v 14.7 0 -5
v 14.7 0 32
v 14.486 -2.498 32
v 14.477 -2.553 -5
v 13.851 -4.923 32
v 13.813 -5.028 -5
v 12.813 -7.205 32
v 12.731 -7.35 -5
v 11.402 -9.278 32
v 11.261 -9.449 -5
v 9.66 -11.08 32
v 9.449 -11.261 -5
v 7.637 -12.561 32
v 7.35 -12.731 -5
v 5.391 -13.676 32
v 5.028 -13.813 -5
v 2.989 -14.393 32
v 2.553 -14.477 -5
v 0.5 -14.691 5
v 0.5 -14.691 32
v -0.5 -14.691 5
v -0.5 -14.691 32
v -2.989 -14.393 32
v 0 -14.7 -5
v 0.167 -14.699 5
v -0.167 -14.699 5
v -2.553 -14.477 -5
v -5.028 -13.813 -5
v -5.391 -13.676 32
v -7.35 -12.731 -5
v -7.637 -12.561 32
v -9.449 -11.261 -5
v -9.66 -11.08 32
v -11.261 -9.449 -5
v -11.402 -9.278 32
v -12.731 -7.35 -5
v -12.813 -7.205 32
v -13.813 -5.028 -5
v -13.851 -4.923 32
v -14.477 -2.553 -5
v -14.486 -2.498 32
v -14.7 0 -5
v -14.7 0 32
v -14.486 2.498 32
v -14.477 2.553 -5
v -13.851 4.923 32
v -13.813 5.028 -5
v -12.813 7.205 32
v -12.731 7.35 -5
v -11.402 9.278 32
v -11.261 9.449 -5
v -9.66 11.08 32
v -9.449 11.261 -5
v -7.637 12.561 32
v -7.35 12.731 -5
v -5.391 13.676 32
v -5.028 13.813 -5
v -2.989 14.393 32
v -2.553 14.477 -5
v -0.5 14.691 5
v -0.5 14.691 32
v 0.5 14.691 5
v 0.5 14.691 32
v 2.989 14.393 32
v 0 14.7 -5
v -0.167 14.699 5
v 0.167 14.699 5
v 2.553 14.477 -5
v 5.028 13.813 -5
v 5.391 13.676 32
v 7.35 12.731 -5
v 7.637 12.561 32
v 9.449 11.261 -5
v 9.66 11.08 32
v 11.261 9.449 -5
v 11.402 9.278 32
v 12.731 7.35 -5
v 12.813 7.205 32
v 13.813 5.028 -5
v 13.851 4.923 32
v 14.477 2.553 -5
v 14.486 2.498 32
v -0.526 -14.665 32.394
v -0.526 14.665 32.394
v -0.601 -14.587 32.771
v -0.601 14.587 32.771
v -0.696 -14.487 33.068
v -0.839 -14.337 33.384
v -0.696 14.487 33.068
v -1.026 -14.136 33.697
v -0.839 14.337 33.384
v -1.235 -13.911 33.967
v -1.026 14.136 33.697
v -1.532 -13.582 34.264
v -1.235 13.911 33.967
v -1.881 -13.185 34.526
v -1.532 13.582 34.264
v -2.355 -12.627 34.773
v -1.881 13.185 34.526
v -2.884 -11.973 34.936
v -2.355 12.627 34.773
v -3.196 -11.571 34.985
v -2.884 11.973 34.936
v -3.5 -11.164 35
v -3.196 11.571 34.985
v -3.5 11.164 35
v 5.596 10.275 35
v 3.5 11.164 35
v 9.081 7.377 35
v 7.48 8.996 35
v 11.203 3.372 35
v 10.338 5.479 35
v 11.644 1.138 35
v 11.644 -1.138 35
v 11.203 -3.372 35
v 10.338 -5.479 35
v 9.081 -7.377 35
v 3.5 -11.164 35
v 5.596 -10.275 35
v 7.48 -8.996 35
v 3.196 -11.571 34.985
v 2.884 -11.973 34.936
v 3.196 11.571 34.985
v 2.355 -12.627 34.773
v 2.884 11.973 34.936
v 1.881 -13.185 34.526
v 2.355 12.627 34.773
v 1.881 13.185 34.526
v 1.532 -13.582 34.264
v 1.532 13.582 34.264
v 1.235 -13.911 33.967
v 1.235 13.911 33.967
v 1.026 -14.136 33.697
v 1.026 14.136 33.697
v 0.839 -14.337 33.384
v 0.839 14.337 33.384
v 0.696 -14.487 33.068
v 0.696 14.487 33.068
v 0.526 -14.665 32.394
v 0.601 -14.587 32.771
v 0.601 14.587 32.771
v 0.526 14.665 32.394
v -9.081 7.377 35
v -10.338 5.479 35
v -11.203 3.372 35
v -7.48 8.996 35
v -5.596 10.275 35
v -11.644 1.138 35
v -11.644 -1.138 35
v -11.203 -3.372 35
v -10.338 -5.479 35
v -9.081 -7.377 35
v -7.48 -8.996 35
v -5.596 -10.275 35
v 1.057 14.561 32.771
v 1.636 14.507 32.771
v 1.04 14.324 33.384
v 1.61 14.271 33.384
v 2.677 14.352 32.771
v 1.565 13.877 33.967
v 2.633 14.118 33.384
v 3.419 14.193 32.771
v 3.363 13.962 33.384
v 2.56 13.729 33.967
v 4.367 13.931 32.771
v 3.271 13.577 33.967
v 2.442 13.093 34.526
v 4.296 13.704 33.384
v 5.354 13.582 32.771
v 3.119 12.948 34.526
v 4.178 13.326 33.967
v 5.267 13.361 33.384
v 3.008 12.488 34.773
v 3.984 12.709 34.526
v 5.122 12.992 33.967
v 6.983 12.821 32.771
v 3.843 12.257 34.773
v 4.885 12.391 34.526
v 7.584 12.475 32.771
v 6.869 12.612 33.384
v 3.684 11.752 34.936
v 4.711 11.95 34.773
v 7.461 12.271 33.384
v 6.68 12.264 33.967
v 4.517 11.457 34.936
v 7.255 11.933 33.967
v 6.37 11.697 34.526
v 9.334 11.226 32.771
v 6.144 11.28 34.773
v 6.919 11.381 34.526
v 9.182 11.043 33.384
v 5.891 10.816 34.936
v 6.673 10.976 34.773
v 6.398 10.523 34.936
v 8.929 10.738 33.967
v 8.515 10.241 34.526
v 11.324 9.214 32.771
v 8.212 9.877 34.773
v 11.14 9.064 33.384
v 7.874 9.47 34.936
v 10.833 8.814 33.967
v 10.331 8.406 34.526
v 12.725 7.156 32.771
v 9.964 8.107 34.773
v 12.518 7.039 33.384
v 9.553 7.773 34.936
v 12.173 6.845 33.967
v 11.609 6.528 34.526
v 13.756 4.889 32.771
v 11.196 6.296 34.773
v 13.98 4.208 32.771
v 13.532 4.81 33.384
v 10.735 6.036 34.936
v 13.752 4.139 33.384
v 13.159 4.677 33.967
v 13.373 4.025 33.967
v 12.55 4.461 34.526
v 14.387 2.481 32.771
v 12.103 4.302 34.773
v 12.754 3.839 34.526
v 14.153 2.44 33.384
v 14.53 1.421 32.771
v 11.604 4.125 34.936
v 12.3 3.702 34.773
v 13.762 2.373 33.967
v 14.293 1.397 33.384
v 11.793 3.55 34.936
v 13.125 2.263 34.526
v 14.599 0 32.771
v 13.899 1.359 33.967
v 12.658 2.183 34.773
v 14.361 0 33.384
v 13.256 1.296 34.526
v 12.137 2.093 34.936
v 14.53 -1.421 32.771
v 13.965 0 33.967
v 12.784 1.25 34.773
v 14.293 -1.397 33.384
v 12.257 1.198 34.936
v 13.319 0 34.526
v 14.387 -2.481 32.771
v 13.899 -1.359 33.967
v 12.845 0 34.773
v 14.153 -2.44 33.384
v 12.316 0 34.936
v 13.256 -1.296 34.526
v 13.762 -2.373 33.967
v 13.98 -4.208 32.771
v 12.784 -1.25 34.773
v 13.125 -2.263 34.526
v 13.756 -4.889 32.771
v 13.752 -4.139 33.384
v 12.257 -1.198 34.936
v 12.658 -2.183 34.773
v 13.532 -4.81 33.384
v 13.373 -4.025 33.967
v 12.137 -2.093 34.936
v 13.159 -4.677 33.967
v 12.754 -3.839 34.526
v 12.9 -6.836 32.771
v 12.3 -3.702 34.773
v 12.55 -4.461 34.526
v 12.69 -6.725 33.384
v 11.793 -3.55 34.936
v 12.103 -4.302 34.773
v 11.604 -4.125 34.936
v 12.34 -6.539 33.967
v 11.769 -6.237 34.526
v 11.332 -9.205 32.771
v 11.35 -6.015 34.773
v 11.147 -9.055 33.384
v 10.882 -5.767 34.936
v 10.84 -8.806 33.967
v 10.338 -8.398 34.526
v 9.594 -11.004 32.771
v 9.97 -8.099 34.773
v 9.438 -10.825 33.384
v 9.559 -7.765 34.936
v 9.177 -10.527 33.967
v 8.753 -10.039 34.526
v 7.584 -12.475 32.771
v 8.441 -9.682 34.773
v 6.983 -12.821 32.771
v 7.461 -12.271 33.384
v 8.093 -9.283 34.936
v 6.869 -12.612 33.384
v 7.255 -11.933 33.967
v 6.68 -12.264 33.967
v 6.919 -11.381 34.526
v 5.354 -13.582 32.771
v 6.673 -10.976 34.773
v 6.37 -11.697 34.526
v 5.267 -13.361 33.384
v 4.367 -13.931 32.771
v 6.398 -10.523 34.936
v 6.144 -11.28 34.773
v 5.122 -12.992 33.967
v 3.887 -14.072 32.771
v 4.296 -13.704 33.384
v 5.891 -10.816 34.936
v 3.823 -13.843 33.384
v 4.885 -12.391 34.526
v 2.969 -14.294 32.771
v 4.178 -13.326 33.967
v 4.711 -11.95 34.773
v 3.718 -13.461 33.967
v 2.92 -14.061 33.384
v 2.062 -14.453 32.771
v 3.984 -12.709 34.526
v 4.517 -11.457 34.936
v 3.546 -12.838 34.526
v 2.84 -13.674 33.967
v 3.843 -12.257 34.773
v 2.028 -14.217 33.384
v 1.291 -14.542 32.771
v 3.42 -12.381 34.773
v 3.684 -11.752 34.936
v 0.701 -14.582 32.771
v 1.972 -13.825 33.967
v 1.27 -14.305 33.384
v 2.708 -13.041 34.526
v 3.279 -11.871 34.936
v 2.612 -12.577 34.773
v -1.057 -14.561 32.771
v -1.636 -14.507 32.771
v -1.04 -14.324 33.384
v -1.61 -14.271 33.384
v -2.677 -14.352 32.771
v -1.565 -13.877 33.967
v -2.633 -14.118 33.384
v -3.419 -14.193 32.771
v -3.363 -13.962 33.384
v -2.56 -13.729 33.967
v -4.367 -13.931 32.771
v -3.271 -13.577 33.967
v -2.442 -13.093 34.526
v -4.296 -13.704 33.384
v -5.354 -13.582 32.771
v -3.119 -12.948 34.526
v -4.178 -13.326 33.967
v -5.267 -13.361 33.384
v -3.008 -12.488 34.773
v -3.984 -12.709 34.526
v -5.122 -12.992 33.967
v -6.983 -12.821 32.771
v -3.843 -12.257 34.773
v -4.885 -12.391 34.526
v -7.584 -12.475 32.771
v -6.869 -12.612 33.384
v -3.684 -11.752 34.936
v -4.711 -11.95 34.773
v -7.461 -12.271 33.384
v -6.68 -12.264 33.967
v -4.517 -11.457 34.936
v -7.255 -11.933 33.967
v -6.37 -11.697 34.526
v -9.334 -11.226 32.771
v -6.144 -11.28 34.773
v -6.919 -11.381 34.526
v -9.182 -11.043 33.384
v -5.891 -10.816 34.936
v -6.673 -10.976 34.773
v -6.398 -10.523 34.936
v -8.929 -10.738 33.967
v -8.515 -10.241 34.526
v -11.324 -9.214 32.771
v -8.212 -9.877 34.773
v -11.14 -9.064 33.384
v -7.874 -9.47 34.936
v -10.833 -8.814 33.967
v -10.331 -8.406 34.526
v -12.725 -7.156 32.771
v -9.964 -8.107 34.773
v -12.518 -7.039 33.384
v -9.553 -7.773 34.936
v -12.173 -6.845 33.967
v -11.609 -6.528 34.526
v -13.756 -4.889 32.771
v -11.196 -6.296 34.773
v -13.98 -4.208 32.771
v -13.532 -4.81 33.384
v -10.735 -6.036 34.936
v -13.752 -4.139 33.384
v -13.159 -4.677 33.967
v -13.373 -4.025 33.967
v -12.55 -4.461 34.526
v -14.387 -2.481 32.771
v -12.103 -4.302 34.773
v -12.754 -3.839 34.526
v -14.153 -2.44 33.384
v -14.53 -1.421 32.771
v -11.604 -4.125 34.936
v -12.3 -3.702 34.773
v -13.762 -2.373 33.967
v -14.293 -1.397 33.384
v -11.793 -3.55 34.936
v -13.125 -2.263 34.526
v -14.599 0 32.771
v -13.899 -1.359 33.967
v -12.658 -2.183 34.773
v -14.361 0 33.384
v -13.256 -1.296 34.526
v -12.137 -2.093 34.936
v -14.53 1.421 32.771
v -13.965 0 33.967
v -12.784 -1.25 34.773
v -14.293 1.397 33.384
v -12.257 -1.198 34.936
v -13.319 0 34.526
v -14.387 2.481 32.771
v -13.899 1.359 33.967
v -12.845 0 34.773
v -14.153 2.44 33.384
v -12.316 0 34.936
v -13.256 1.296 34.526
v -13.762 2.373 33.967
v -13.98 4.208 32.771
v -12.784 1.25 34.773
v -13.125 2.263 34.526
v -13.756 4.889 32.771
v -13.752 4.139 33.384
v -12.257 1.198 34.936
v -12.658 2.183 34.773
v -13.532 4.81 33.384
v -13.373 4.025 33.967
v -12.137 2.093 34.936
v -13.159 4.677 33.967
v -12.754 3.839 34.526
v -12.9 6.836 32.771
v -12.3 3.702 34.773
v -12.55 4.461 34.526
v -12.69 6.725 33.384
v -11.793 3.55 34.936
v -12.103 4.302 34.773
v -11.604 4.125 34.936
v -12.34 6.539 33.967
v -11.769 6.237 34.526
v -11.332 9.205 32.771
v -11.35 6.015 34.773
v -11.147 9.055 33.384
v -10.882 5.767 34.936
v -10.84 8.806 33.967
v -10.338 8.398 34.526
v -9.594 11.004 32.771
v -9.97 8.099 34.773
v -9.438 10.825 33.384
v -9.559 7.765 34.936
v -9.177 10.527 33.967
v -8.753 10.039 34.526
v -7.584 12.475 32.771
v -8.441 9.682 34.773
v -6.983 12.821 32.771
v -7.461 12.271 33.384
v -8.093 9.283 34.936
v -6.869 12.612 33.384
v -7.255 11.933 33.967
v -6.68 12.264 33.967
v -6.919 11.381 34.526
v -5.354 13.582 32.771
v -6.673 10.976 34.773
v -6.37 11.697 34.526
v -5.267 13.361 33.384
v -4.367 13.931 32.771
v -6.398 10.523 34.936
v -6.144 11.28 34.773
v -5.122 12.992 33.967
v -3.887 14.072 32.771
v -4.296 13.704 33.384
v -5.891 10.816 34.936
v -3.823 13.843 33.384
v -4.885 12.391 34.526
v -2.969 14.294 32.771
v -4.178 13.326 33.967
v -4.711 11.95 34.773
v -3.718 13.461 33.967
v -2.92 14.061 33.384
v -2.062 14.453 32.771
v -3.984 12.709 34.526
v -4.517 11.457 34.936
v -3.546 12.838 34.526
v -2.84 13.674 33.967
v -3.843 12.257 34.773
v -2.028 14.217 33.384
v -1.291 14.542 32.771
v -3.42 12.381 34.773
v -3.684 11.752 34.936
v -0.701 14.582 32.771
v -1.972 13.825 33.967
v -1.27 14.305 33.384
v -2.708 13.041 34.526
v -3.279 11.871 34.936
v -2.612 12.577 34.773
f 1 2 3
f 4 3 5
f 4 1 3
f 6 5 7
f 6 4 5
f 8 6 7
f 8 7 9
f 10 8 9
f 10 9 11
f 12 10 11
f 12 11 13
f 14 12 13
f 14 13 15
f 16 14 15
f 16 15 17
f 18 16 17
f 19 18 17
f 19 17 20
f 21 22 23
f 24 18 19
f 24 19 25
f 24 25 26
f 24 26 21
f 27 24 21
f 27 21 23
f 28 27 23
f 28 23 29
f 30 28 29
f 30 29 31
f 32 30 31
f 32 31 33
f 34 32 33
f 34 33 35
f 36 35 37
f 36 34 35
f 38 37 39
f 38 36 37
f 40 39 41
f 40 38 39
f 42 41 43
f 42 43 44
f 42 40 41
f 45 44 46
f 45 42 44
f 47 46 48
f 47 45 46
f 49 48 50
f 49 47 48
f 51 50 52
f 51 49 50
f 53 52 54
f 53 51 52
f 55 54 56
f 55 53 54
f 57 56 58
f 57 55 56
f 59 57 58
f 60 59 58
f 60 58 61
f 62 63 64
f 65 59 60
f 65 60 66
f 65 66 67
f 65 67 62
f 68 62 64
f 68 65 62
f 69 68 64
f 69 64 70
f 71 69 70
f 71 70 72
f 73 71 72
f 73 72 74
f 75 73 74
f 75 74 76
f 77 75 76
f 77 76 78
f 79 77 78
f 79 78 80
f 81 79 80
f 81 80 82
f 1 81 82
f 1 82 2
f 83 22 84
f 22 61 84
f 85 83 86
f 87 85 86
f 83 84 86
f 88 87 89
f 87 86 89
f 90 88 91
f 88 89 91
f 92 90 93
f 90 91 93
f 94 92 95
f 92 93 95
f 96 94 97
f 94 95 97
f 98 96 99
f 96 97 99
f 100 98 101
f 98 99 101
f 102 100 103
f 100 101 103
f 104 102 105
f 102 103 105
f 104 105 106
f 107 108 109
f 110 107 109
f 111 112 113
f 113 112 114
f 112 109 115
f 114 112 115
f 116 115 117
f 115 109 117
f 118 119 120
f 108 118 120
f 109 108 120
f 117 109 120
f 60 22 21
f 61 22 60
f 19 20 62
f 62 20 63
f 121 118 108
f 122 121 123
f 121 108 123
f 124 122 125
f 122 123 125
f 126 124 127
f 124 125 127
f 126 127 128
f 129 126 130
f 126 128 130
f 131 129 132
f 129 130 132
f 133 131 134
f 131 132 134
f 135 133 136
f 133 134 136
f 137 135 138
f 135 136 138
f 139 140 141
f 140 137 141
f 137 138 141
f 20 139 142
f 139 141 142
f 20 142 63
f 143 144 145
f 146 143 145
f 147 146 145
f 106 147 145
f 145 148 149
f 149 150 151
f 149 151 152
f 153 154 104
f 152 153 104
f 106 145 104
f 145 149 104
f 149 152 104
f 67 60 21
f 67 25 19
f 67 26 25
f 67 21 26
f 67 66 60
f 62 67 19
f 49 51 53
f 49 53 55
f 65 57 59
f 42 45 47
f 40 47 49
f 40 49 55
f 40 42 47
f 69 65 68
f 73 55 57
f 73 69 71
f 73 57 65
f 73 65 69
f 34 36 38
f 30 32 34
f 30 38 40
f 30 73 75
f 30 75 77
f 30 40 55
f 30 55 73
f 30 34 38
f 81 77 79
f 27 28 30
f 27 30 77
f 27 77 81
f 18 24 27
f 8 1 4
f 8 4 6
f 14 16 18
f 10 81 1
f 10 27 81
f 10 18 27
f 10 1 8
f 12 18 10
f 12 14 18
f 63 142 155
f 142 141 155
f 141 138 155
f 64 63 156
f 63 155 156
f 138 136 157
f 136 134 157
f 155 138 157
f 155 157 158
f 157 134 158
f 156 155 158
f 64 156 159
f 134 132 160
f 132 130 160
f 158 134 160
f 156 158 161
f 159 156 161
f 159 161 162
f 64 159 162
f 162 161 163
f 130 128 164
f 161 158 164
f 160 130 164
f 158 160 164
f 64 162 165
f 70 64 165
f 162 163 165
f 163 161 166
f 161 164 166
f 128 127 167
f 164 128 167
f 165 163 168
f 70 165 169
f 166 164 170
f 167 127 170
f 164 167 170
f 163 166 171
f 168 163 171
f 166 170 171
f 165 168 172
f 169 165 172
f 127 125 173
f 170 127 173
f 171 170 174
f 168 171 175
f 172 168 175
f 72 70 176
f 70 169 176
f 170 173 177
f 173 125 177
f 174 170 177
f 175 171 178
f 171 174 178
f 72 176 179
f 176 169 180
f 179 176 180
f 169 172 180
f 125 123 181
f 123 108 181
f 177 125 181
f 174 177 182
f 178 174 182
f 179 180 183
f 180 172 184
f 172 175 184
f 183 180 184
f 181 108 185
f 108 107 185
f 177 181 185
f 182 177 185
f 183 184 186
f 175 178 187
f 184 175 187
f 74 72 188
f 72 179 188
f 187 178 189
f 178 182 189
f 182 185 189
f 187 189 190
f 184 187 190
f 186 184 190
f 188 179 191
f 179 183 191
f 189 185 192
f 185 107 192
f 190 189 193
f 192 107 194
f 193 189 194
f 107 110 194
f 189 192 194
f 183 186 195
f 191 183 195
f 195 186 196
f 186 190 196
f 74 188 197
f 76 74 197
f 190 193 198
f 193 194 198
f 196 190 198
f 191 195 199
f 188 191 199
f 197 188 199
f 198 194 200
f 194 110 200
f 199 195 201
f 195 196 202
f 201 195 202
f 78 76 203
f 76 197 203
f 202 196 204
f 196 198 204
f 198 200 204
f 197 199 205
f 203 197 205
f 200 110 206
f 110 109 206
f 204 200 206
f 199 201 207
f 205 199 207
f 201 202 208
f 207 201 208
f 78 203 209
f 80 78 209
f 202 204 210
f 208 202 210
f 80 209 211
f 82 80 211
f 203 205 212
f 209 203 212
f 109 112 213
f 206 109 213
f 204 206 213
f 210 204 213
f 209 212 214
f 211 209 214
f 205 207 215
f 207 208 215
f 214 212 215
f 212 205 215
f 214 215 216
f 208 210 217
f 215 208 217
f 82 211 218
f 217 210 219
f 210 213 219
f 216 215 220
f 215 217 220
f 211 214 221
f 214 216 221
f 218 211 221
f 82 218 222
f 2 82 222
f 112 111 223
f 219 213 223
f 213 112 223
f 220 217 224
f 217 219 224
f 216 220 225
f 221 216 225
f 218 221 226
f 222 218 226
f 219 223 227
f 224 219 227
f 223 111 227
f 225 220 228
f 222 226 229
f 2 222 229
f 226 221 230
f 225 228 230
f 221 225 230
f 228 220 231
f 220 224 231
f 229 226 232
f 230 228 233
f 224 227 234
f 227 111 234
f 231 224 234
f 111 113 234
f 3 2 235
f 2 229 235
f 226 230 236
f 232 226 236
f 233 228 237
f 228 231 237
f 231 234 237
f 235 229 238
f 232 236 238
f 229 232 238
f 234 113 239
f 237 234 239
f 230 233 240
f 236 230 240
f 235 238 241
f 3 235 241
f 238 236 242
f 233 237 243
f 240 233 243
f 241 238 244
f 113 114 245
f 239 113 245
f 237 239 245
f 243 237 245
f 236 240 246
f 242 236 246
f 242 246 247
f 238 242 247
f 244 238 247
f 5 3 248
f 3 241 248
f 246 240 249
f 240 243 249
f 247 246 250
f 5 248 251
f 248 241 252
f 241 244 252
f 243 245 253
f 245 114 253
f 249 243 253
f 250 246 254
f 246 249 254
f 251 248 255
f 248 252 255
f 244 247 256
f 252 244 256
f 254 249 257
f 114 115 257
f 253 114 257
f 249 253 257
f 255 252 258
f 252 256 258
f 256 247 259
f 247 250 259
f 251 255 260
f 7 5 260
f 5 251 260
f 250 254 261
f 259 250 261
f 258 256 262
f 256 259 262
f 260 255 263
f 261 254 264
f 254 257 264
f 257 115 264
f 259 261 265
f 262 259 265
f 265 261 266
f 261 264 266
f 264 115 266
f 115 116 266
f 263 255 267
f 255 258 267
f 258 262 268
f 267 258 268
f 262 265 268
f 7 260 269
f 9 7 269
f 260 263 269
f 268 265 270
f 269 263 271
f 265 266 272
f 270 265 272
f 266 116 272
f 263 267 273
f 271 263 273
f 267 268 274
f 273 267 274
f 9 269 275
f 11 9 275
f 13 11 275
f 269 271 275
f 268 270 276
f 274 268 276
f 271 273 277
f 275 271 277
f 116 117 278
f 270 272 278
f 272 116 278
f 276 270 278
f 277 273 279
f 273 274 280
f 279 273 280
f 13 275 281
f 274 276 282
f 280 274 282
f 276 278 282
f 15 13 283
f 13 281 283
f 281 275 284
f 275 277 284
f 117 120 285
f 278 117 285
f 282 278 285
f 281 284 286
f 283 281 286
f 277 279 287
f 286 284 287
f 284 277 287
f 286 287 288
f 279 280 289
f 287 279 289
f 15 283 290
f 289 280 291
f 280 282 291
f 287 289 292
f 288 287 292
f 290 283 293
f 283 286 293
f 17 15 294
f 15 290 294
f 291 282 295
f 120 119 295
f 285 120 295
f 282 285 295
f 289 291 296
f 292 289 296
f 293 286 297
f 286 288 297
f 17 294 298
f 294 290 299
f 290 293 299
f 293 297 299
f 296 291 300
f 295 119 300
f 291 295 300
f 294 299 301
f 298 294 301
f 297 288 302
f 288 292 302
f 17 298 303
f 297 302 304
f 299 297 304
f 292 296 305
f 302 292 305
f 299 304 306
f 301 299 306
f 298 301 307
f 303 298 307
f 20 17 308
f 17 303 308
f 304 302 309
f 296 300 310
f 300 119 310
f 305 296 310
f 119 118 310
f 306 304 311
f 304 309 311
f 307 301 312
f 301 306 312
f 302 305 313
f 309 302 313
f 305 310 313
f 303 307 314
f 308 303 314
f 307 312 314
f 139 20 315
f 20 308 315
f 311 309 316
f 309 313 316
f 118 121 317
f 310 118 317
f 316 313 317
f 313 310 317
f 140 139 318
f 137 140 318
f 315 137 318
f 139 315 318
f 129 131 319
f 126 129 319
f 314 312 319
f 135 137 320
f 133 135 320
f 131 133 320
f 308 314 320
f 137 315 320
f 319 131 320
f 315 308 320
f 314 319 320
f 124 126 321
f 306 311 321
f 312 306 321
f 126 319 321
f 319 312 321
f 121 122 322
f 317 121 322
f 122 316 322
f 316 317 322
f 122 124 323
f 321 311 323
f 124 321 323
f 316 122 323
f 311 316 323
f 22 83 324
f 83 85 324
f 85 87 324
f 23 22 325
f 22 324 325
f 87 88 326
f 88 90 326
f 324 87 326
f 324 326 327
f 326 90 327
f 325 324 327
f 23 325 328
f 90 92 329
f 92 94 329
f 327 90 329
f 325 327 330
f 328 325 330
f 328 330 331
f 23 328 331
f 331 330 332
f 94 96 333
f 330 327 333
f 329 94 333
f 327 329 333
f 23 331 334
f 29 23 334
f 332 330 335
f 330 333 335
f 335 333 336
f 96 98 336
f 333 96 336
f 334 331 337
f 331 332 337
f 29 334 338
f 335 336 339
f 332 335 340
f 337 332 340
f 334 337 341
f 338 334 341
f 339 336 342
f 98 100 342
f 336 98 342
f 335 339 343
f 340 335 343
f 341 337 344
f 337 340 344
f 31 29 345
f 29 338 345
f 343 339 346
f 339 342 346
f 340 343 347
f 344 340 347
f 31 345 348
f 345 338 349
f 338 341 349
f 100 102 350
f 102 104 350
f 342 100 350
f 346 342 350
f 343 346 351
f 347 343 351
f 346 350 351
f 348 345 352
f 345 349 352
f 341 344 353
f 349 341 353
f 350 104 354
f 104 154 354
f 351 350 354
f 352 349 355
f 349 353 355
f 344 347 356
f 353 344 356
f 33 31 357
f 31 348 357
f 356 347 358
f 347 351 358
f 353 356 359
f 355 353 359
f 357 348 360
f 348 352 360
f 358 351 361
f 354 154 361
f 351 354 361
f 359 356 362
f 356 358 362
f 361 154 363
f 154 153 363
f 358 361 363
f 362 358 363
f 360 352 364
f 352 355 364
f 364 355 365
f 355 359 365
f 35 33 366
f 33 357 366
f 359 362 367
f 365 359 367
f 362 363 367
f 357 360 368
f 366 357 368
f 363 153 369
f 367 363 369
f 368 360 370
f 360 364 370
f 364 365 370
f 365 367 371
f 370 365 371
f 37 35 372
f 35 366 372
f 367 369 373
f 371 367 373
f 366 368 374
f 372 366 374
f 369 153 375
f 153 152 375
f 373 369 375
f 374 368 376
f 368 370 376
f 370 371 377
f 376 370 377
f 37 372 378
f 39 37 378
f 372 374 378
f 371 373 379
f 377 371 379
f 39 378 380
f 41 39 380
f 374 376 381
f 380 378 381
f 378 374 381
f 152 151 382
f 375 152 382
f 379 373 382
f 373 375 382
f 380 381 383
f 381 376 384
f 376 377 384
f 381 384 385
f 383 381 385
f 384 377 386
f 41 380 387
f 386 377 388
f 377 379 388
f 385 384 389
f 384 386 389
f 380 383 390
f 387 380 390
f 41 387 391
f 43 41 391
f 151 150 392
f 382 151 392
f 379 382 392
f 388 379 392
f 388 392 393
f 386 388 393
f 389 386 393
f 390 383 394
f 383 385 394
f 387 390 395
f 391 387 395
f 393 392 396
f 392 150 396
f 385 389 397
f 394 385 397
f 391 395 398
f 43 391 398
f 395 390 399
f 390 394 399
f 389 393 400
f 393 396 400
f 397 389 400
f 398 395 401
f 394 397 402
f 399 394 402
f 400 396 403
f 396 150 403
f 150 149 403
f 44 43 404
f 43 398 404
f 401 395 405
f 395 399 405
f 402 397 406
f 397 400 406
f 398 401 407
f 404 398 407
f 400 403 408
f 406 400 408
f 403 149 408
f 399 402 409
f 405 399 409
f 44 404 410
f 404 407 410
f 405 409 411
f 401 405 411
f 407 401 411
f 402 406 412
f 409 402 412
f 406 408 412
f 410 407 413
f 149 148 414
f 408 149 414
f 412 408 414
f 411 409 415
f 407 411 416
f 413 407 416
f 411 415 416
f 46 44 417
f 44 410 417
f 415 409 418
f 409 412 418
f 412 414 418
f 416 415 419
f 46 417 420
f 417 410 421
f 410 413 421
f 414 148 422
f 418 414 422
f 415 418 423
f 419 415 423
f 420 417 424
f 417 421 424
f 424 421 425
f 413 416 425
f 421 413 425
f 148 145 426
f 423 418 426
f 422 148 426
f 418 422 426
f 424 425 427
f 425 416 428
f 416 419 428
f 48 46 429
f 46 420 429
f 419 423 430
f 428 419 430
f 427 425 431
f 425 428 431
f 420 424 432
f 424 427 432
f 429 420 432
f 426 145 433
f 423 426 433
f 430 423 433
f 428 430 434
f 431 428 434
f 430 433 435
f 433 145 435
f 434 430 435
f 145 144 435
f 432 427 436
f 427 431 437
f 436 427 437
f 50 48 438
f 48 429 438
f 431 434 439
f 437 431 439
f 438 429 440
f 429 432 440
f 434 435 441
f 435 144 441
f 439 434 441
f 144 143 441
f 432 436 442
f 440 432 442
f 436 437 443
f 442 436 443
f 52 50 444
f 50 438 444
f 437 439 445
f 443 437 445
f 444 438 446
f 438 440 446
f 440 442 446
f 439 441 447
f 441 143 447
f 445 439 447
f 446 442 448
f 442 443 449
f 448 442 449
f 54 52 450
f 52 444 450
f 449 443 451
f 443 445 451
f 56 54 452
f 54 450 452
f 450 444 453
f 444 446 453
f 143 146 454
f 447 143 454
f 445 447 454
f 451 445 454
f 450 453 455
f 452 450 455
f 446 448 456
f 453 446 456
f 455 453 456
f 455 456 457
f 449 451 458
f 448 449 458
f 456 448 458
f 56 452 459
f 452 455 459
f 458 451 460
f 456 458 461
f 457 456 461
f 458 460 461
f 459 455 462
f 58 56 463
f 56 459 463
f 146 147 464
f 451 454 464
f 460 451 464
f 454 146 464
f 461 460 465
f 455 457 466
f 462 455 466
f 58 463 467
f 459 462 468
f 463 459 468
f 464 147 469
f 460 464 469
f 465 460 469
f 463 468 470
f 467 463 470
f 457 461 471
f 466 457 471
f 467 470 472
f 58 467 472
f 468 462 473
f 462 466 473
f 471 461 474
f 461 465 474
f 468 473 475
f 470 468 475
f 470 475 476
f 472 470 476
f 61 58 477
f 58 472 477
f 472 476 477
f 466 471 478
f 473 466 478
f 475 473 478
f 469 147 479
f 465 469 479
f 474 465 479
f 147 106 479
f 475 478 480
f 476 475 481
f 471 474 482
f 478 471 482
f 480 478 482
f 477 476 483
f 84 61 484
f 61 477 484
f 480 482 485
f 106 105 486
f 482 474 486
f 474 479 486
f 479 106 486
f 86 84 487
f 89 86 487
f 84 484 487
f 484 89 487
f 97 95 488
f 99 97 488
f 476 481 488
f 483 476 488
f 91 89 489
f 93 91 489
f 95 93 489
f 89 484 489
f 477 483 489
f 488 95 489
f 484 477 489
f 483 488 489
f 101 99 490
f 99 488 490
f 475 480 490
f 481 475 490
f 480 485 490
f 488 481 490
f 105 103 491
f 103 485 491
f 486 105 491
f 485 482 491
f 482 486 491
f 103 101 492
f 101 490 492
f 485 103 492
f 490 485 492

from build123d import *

# Parameters (mm, degrees)
SKETCH002_R  = 14.7
PAD002_DEPTH = 40
SKETCH003_W  = 1
SKETCH003_H  = 40
POCKET_DEPTH = 30
FILLET_R     = 3


with BuildPart() as part:
    # Sketch002 (on Binder) → Pad002 (new body)
    with BuildSketch(Plane(origin=(0, 0, -5), x_dir=(1, 0, 0), z_dir=(0, 0, -1))):
        Circle(SKETCH002_R)
    extrude(amount=-PAD002_DEPTH)

    # Sketch003 (on Face3 of Pad002) → Pocket (cut)
    with BuildSketch(Plane.XY.offset(35)):
        Rectangle(SKETCH003_W, SKETCH003_H)
    extrude(amount=-POCKET_DEPTH, mode=Mode.SUBTRACT)

    # Fillet
    fillet_edges = [part.edges().sort_by_distance(p)[0] for p in [
        (-14.7, 0, 35),
        (-0.5, 0, 35),
        (10.569768, -10.216164, 35),
        (0.5, 0, 35),
        (10.569768, 10.216164, 35),
    ]]
    fillet(fillet_edges, radius=FILLET_R)


solid = part.part
